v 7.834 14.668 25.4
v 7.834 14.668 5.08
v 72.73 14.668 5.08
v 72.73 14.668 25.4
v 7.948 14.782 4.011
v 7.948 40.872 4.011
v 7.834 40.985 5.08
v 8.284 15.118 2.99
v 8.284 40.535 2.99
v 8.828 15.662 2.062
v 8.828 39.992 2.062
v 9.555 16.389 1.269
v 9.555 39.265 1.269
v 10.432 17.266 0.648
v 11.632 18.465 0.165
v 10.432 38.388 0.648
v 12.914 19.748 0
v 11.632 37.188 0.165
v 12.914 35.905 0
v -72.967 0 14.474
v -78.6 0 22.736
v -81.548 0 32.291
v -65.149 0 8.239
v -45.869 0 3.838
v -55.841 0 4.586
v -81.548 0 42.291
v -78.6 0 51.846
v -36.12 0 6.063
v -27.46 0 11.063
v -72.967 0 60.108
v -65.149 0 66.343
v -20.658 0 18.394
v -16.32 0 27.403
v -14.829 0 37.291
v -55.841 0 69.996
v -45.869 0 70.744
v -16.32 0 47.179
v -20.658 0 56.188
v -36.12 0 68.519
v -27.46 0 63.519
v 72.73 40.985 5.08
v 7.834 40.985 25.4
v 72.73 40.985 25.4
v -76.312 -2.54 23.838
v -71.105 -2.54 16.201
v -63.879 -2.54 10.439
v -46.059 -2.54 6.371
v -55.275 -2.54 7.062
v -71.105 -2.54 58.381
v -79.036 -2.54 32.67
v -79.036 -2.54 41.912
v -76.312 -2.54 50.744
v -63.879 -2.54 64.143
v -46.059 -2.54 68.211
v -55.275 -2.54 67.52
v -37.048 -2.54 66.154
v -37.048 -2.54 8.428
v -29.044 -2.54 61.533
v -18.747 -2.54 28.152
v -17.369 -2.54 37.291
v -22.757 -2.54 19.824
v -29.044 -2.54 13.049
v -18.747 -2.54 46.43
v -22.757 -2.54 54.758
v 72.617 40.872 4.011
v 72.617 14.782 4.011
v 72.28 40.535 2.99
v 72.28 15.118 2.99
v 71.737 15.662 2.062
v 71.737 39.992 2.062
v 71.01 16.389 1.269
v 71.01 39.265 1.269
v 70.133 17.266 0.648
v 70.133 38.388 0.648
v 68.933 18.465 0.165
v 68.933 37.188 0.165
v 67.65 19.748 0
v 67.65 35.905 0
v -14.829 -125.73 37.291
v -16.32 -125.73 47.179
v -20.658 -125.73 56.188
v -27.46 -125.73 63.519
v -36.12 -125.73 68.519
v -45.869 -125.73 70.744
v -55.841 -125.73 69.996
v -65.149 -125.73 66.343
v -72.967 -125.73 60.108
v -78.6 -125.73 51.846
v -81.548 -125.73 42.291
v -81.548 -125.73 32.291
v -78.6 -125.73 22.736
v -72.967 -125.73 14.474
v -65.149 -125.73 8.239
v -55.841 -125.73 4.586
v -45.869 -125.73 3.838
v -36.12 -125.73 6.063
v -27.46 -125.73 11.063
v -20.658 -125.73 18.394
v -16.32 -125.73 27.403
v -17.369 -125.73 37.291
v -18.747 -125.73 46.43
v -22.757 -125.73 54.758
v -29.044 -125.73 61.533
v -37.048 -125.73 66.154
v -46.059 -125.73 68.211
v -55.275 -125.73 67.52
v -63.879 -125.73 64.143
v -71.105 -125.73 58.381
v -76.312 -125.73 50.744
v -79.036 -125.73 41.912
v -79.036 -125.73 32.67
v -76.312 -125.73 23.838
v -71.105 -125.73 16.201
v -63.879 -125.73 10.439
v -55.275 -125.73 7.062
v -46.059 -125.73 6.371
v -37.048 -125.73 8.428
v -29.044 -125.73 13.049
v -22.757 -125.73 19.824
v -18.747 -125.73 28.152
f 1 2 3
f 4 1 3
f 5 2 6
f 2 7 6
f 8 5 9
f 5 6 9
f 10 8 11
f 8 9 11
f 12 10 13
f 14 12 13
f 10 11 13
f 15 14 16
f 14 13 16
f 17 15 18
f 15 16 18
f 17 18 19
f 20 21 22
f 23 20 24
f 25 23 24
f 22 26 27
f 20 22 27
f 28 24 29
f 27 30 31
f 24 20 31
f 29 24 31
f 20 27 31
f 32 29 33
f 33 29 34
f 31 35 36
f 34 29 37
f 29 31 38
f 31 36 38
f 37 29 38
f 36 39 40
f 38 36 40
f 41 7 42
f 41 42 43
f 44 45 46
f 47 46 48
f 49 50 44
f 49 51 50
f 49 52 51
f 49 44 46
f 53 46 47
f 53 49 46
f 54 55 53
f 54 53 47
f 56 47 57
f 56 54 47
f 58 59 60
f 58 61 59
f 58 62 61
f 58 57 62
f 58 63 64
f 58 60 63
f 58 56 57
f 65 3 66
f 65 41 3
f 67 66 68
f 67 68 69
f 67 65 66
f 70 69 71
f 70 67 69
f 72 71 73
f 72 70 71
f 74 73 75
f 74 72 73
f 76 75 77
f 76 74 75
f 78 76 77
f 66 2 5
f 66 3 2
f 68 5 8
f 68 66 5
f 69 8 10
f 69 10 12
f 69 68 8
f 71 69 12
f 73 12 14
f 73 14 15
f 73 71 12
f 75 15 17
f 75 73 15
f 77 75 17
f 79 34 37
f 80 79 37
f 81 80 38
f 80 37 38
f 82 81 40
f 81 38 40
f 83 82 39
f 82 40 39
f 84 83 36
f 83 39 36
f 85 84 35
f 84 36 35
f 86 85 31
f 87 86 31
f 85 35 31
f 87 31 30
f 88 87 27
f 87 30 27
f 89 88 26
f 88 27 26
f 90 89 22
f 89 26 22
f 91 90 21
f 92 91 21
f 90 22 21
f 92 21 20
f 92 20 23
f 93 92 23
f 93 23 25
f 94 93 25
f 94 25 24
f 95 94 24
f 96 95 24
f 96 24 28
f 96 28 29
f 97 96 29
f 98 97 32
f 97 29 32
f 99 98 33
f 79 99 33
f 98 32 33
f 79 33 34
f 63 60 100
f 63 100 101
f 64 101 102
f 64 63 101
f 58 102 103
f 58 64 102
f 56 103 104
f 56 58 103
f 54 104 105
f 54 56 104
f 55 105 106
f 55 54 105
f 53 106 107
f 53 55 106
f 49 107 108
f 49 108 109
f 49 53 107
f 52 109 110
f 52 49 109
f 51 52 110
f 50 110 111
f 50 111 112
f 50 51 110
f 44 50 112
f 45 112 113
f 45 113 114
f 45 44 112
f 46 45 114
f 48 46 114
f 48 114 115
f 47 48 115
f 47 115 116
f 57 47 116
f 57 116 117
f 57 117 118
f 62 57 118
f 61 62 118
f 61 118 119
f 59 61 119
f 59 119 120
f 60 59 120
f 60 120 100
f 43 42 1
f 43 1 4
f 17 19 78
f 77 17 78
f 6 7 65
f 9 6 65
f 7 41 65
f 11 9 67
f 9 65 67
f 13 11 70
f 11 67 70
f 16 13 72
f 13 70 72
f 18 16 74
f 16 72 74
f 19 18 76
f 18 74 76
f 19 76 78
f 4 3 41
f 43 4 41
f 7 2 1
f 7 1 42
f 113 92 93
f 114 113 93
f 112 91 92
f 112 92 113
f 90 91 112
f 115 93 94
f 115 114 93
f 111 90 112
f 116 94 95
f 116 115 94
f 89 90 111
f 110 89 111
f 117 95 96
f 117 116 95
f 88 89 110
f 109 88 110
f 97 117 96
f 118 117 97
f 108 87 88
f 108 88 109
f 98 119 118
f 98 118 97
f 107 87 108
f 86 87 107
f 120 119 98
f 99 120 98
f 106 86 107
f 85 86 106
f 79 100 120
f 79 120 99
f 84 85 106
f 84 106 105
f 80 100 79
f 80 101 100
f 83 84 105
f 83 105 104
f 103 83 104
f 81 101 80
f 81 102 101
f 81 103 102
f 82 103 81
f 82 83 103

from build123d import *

# Parameters (mm, degrees)
F0_R     = 33.546516
F1_DEPTH = 125.73
F2_T     = -2.54
F3_W     = 64.896105
F3_H     = 26.317318
F4_DEPTH = 25.4
F5_R     = 5.08


with BuildPart() as f1:
    # F0 (on Front) → F1 (new body)
    with BuildSketch(Plane.XZ):
        with Locations((-48.37586, 37.290942)):
            Circle(F0_R)
    extrude(amount=F1_DEPTH)

    # F2
    f2_openings = [f1.faces().sort_by_distance(p)[0] for p in [
        (-48.37586, -125.73, 37.290942),
    ]]
    offset(amount=F2_T, openings=f2_openings)


with BuildPart() as f4:
    # F3 (on Top) → F4 (new body)
    with BuildSketch(Plane.XY):
        with Locations((40.282348, 27.826776)):
            Rectangle(F3_W, F3_H)
    extrude(amount=F4_DEPTH)

    # F5
    f5_edges = [f4.edges().sort_by_distance(p)[0] for p in [
        (40.282347, 40.985435, 0),
        (7.834295, 27.826776, 0),
        (40.282347, 14.668117, 0),
        (72.7304, 27.826776, 0),
    ]]
    fillet(f5_edges, radius=F5_R)


solid = Compound([f1.part, f4.part])
